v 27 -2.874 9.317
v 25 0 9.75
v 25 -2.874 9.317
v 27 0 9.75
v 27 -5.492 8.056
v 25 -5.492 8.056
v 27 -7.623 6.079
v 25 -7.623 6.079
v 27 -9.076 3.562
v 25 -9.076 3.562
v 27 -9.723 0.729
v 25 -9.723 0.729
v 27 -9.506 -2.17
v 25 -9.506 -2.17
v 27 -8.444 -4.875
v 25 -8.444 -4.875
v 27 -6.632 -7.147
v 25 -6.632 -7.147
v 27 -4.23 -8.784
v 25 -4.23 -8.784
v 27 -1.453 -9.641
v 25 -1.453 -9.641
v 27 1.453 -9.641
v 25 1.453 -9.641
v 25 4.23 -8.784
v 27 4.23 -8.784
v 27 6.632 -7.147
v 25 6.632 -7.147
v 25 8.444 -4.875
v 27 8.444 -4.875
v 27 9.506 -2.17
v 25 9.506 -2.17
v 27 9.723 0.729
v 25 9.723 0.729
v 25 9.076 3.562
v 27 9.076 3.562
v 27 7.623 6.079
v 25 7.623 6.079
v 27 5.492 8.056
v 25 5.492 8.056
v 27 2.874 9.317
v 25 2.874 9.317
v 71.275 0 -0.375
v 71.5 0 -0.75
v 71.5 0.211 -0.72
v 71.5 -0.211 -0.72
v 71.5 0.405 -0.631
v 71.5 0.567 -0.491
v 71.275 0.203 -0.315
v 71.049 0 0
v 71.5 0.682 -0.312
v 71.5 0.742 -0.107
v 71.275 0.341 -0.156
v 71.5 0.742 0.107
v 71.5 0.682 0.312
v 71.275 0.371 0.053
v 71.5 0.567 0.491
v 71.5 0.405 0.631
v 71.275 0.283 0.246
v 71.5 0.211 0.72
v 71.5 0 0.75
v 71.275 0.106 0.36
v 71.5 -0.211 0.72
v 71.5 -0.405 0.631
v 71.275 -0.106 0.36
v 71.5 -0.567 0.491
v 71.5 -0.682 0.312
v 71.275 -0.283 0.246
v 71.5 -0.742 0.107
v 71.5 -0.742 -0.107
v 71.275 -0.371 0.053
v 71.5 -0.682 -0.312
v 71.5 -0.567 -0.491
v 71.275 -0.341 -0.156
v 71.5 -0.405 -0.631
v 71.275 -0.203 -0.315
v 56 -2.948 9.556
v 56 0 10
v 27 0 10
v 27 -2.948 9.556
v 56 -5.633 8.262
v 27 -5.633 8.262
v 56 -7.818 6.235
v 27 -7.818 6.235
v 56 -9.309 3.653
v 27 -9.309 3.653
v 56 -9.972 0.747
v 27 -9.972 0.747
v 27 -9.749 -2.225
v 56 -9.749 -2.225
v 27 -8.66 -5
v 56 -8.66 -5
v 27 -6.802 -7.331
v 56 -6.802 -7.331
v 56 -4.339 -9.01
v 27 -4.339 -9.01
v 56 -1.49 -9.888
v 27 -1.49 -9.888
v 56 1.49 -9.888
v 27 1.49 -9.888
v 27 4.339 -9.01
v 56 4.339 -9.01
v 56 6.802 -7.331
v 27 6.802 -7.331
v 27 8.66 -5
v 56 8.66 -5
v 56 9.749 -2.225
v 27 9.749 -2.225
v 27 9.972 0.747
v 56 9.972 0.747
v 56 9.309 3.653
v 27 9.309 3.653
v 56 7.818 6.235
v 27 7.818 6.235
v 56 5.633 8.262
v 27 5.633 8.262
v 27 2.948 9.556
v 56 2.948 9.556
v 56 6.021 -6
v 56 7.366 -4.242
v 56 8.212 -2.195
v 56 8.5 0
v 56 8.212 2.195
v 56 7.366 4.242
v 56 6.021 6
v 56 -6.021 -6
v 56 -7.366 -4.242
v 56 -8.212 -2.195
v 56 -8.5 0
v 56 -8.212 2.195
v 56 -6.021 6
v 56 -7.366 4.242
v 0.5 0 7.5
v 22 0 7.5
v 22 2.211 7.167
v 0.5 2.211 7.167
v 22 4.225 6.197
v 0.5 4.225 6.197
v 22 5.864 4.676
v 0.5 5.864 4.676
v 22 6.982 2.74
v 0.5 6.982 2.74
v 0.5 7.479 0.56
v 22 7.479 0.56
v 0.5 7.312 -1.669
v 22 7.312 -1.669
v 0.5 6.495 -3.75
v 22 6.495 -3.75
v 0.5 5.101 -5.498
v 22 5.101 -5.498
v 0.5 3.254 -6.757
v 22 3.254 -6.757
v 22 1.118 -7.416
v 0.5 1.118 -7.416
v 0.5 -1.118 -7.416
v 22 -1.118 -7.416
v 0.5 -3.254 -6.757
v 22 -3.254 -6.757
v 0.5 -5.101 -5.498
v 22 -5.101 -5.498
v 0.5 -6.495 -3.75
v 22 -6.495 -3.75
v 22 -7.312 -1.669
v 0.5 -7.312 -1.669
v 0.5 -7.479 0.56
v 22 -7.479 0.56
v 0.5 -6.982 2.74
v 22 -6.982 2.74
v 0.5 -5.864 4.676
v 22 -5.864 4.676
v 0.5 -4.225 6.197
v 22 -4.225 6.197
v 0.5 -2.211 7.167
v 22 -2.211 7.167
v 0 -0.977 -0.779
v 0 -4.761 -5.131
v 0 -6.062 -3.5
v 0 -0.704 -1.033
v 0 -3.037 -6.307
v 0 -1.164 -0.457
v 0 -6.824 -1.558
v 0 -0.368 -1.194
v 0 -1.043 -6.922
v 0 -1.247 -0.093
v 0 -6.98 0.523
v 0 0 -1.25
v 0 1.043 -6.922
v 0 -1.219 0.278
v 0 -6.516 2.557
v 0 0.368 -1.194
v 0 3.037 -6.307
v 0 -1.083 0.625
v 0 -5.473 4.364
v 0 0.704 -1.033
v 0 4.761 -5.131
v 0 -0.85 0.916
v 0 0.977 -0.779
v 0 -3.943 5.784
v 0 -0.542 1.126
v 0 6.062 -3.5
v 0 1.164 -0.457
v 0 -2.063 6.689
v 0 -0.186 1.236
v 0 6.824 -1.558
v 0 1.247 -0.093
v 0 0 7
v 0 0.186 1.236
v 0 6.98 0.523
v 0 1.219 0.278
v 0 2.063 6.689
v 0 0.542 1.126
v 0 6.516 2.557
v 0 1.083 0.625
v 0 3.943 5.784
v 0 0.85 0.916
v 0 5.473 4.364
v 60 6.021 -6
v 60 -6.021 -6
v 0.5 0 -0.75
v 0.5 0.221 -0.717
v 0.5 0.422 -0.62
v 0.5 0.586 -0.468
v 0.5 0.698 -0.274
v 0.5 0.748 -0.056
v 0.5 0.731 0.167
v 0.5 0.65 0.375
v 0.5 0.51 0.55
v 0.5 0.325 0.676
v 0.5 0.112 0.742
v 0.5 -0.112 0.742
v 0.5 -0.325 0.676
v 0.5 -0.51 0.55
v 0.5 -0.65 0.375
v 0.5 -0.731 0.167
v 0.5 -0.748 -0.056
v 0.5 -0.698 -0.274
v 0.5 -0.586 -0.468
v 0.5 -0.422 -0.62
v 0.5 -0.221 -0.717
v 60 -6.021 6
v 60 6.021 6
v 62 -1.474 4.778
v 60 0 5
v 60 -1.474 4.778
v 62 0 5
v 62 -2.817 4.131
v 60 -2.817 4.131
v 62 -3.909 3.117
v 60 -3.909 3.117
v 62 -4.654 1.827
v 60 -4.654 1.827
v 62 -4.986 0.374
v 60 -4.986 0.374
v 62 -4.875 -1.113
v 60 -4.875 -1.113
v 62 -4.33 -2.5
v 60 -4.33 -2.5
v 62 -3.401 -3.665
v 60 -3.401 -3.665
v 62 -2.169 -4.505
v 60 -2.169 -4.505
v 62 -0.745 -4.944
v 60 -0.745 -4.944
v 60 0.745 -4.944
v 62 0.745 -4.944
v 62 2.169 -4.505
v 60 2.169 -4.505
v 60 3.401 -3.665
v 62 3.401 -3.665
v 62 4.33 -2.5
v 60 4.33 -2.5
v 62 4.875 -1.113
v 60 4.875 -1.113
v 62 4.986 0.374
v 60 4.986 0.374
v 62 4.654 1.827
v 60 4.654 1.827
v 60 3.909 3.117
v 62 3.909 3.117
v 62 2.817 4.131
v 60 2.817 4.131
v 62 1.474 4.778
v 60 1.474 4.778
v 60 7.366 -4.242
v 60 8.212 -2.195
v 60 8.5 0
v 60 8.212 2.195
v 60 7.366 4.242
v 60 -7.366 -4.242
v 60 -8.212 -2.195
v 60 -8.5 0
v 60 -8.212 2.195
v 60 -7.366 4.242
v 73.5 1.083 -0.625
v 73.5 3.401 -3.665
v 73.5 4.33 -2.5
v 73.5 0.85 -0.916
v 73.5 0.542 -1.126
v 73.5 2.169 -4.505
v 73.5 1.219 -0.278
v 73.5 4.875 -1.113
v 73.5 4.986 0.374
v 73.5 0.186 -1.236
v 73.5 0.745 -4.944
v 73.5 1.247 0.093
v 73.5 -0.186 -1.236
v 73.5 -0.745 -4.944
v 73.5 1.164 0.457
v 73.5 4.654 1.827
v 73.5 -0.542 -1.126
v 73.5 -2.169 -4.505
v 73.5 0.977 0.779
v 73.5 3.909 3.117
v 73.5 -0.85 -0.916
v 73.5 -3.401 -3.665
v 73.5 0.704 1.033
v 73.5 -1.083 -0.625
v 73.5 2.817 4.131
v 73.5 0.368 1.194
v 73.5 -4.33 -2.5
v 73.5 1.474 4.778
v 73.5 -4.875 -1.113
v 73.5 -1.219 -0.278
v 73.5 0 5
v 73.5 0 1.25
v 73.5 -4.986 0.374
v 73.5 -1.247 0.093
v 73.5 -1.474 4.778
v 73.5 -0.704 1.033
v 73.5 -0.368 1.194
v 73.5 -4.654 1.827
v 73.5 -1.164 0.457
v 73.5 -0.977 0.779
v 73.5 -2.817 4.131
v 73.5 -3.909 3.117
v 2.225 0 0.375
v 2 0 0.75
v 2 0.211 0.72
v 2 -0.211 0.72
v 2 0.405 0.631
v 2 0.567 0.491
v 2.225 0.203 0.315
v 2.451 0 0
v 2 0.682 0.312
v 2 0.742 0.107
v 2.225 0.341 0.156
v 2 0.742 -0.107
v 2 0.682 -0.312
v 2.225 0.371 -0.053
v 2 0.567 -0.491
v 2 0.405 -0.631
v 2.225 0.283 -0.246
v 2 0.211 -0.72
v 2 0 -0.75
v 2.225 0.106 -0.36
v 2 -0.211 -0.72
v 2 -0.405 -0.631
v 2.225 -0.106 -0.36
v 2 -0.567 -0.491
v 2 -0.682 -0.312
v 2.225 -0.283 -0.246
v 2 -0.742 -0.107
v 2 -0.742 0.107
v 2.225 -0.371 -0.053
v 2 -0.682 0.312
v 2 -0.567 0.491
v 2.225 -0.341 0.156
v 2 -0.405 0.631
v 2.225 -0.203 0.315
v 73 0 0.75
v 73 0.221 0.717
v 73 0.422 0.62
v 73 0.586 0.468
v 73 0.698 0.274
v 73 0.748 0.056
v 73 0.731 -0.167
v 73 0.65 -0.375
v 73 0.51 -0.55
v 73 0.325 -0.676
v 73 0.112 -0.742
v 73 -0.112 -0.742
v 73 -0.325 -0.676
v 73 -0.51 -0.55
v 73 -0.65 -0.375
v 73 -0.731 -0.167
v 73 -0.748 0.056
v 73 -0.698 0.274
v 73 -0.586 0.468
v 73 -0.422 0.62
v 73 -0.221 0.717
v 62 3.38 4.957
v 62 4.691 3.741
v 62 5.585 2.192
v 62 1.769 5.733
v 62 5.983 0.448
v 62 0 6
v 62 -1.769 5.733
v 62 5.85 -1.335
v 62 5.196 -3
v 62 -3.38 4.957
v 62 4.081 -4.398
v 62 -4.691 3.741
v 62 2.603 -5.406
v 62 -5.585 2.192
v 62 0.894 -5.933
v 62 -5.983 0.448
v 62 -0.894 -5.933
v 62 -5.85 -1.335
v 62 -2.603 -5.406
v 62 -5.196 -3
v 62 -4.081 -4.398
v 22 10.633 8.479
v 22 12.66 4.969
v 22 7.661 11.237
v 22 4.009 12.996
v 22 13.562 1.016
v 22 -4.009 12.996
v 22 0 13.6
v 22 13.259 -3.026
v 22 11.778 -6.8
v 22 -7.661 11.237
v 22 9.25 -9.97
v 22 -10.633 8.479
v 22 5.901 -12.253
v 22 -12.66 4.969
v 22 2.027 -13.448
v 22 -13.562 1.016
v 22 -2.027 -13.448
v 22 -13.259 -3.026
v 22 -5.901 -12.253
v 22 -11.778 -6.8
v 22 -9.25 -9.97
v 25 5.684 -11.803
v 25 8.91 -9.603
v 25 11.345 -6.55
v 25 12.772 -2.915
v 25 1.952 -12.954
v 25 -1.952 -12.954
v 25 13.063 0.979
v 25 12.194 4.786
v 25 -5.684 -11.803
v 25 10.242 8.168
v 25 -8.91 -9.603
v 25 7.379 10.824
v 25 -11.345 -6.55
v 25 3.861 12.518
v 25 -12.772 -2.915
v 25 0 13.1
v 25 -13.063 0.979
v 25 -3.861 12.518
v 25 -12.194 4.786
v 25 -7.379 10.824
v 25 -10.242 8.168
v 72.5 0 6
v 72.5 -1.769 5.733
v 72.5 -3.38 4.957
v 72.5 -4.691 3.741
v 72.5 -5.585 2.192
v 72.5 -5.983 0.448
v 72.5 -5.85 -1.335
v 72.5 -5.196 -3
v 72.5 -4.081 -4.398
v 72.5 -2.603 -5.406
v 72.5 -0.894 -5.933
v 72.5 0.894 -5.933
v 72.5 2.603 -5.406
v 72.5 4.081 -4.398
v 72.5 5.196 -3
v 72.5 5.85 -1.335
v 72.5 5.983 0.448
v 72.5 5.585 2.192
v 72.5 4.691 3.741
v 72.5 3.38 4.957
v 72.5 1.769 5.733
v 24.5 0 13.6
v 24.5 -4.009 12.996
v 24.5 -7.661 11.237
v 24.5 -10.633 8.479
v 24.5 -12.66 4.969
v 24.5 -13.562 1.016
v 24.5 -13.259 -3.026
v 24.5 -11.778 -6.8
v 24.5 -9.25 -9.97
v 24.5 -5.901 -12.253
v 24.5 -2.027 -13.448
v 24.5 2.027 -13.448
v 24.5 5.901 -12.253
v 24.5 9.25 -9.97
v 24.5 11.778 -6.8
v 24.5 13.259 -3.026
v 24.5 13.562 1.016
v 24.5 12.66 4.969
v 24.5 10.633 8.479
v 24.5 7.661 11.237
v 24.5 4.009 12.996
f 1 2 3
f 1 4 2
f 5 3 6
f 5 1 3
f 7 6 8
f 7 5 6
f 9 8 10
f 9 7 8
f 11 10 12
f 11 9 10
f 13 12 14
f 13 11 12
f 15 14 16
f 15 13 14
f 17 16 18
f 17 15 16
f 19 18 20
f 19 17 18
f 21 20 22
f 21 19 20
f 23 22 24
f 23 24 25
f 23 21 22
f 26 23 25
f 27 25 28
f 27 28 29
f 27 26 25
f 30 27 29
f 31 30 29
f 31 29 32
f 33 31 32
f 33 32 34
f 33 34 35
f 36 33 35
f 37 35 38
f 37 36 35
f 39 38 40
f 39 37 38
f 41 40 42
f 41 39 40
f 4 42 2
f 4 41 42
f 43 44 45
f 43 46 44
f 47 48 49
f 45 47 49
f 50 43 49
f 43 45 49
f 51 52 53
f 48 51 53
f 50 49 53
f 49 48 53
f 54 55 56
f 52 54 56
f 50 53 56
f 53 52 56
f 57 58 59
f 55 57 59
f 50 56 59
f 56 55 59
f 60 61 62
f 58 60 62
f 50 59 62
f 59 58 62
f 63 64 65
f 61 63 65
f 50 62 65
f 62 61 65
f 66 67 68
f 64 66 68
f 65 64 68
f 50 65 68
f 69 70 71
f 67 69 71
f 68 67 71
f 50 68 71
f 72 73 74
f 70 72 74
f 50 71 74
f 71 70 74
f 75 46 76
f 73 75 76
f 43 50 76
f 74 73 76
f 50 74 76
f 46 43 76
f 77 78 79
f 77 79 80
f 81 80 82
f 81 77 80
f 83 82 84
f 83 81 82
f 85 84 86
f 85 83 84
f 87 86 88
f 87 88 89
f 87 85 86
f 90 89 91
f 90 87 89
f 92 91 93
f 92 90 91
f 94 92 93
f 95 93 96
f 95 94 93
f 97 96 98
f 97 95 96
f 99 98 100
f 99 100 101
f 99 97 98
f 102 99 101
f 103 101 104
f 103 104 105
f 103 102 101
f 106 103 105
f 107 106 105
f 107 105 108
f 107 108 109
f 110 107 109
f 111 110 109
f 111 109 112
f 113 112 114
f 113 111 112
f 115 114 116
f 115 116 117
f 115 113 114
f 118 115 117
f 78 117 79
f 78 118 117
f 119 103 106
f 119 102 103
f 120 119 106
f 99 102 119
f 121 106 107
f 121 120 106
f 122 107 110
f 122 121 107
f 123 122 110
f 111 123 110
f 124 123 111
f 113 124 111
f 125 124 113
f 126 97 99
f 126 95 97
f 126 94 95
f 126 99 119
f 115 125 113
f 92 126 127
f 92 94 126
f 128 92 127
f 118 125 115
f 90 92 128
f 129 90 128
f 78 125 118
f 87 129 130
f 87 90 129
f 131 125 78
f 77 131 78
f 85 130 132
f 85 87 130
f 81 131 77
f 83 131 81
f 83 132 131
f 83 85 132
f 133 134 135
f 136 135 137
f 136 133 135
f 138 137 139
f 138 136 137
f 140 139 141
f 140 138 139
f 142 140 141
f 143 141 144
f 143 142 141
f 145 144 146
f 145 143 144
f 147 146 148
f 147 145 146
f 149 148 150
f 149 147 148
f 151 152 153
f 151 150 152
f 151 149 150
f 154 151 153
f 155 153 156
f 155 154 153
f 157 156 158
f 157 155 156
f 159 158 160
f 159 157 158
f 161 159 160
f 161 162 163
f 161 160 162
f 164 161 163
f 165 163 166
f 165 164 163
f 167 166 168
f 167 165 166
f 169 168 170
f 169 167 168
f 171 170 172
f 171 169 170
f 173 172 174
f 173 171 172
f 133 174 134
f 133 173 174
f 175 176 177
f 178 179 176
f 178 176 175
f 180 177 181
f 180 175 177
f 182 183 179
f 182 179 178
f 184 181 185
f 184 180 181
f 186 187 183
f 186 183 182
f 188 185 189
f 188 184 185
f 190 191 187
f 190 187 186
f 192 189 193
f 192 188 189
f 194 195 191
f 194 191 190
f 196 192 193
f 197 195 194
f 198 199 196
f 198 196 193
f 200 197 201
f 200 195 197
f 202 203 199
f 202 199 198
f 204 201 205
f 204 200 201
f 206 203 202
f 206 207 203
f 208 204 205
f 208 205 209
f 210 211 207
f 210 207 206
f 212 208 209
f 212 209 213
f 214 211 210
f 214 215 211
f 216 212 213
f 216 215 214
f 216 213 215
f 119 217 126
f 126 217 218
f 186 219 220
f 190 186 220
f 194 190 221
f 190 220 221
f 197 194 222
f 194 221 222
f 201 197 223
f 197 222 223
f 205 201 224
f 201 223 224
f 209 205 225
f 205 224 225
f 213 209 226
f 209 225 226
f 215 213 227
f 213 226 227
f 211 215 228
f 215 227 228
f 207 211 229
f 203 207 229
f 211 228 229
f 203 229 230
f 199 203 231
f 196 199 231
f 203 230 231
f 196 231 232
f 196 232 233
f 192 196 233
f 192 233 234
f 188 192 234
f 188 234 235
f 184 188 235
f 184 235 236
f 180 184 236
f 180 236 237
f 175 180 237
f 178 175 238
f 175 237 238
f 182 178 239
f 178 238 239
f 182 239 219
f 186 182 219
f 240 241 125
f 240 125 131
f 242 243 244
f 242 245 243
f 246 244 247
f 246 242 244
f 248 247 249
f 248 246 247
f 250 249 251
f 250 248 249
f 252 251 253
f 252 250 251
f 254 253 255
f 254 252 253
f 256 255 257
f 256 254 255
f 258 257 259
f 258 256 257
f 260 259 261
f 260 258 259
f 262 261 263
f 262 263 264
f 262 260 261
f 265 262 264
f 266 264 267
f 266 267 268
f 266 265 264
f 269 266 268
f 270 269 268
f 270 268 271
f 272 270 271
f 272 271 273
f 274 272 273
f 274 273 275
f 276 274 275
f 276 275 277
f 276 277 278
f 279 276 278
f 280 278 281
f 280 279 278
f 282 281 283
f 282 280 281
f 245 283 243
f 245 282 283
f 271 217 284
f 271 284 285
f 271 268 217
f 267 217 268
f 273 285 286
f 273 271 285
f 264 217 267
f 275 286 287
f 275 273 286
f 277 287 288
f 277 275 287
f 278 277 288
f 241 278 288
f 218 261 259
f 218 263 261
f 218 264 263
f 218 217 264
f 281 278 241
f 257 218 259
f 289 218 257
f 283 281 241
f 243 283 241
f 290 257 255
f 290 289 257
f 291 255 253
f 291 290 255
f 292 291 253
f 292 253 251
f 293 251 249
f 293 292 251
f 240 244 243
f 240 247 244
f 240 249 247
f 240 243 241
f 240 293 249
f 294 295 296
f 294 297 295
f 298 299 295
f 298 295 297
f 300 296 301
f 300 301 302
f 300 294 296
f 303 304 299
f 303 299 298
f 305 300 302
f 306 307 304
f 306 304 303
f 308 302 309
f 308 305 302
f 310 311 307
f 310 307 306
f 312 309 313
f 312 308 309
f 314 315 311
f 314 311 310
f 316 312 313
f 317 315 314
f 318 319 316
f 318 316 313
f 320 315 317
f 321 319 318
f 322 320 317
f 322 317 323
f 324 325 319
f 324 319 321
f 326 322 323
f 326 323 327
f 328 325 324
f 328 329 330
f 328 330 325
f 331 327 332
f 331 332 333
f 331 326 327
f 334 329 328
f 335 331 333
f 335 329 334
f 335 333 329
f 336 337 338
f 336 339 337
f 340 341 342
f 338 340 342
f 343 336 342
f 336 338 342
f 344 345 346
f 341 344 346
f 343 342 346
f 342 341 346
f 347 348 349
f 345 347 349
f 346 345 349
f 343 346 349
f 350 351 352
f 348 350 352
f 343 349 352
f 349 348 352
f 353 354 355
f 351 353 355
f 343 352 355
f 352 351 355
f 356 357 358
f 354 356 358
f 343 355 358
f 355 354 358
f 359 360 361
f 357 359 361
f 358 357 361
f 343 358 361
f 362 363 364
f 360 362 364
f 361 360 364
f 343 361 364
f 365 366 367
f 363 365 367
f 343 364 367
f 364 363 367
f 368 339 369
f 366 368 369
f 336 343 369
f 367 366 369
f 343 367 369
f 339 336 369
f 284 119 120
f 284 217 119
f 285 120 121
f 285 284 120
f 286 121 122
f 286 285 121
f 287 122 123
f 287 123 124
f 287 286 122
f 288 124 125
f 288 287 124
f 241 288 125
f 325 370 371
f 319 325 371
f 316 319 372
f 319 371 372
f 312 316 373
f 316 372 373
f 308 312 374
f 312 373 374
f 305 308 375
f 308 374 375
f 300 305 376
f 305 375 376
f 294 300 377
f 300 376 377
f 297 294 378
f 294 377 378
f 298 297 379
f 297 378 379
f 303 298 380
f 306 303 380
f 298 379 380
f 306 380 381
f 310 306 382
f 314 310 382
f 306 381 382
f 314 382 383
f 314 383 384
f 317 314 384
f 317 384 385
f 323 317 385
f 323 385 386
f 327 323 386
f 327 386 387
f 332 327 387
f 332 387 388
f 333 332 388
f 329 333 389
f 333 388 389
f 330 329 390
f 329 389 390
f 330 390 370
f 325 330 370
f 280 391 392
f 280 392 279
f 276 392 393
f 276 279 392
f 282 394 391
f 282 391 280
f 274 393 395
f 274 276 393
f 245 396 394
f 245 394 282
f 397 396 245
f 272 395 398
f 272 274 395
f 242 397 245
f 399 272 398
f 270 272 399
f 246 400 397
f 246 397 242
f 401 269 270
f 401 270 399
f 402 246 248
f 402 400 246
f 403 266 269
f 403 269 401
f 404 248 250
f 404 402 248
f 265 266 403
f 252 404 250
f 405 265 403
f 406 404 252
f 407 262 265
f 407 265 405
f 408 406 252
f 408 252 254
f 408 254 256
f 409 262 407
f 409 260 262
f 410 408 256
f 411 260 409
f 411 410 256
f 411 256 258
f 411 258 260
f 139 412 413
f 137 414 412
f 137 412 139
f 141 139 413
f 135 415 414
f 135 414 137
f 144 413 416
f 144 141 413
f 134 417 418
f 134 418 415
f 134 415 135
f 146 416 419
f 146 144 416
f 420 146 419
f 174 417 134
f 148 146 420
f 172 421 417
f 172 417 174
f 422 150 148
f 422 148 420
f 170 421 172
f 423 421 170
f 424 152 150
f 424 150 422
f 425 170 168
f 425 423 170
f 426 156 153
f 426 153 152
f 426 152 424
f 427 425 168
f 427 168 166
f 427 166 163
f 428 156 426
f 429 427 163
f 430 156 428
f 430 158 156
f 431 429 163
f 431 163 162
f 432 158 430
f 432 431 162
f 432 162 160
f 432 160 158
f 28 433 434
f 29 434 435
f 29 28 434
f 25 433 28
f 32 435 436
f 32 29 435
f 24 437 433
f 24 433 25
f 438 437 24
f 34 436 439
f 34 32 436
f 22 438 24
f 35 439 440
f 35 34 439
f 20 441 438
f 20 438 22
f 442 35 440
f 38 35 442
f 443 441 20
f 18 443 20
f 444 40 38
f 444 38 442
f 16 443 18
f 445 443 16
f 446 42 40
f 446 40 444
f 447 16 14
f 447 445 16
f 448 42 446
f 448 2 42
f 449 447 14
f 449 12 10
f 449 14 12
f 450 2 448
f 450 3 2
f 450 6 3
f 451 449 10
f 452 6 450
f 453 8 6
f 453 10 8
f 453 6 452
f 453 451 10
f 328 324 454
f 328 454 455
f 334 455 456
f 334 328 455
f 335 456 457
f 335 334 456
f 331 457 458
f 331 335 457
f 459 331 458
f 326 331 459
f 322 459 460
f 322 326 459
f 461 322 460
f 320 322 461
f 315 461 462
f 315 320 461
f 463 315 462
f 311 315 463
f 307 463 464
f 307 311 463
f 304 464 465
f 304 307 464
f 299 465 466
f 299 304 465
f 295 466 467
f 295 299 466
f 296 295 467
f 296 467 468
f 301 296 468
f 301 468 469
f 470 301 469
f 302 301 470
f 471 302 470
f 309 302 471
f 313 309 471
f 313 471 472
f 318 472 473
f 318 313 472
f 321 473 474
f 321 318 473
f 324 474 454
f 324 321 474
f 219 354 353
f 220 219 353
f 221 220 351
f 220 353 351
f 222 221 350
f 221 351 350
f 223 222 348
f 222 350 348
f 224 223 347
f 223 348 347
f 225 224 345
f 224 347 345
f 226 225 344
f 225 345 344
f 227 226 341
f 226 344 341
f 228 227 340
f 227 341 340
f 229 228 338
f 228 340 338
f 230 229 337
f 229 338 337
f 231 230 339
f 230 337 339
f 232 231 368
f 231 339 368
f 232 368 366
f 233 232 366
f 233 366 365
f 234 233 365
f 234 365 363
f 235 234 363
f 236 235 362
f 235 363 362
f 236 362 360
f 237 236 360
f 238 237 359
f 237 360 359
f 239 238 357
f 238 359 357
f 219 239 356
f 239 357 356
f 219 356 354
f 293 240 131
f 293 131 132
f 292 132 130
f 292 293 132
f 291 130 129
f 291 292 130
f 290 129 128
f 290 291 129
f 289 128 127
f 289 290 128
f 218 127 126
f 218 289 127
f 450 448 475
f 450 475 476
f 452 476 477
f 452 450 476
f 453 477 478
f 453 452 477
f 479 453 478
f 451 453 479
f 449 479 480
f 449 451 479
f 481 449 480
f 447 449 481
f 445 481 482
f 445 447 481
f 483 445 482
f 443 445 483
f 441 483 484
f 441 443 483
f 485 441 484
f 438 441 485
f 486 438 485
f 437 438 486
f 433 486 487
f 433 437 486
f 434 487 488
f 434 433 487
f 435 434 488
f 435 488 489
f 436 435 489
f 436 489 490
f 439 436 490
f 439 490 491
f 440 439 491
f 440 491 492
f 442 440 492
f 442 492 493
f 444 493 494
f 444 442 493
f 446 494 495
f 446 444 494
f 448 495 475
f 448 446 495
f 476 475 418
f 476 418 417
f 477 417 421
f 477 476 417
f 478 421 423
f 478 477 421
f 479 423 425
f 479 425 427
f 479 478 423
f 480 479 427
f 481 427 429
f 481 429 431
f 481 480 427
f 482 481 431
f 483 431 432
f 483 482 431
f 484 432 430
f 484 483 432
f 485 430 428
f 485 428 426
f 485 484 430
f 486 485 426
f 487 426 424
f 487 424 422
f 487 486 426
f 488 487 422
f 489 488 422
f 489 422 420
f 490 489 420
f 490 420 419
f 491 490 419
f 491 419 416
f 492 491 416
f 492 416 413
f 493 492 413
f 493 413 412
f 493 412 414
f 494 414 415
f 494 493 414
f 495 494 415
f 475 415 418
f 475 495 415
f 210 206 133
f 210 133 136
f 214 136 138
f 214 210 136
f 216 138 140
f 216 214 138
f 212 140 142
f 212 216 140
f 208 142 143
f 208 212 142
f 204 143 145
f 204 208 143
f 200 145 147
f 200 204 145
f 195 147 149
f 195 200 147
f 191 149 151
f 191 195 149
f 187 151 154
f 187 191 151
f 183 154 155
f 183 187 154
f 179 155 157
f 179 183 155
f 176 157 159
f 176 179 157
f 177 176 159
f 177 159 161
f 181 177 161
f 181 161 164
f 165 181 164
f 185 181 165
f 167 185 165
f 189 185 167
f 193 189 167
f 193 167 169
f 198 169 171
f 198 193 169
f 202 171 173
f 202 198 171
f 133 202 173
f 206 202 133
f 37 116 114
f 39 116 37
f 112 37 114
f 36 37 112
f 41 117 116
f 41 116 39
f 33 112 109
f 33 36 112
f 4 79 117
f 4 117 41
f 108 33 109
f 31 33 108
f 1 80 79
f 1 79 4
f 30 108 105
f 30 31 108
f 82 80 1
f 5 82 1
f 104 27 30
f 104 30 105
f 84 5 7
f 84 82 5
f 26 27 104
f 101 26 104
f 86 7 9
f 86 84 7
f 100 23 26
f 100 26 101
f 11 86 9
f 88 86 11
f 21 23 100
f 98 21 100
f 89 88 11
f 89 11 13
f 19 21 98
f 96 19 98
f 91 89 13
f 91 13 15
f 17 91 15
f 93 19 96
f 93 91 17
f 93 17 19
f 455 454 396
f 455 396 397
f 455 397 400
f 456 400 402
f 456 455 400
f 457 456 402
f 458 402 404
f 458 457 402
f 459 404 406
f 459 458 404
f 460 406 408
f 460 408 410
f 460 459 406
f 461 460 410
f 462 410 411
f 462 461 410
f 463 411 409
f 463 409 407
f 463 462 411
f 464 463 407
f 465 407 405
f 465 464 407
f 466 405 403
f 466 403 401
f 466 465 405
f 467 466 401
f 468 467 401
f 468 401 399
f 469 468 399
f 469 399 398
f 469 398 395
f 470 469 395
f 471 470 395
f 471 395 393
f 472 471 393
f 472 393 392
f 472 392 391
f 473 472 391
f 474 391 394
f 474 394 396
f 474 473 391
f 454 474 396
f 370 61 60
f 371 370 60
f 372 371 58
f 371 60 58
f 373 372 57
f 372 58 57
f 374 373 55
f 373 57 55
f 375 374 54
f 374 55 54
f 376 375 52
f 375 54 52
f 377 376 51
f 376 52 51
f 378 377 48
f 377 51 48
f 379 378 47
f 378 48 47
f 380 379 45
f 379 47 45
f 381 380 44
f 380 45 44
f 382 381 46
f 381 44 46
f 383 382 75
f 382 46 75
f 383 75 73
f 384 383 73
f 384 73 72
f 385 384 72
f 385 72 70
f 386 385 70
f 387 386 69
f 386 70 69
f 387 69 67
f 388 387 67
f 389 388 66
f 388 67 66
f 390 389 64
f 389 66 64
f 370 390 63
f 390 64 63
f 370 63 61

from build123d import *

# Parameters (mm, degrees)
CHANFREIN1_SIZE                     = 0.5
ENL_V_MAT_EXTRU_1_DEPTH             = 4
CHANFREIN2_SIZE                     = 1
DIAM_TRE_DU_PER_AGE_1_5_1_5_1_D     = 1.5
DIAM_TRE_DU_PER_AGE_1_5_1_5_1_DEPTH = 2
DIAM_TRE_DU_PER_AGE_1_5_1_5_1_TIP   = 0.450645464
CHANFREIN3_SIZE                     = 0.5
DIAM_TRE_DU_PER_AGE_1_5_1_5_2_D     = 1.5
DIAM_TRE_DU_PER_AGE_1_5_1_5_2_DEPTH = 2
DIAM_TRE_DU_PER_AGE_1_5_1_5_2_TIP   = 0.450645464
CHANFREIN4_SIZE                     = 0.5
BOSS_EXTRU_1_REACH                  = 77.975
ESQUISSE9_R                         = 7.5
ESQUISSE9_R_2                       = 4.5
CHANFREIN5_SIZE                     = 0.5


with BuildPart() as part:
    # Esquisse1 → Révolution1 (revolve)
    with BuildSketch(Plane.XY, mode=Mode.PRIVATE) as r_volution1_sk:
        Polygon((0, 0), (0, 5), (6, 5), (6, 4.75), (8, 4.75), (8, 7.5), (22, 7.5), (22, 13.6), (25, 13.6), (25, 9.75), (27, 9.75), (27, 10), (56, 10), (56, 8.5), (60, 8.5), (60, 5), (62, 5), (62, 6), (73.5, 6), (73.5, 0), align=None)
    revolve(r_volution1_sk.sketch.rotate(Axis((0, 0, 0), (1, 0, 0)), 90), axis=Axis((0, 0, 0), (1, 0, 0)))

    # Chanfrein1
    chanfrein1_edges = [part.edges().sort_by_distance(p)[0] for p in [
        (0, 0, -5),
        (8, 0, -4.75),
        (8, 0, -7.5),
        (25, 0, -13.6),
    ]]
    chamfer(chanfrein1_edges, length=CHANFREIN1_SIZE)

    # Esquisse2 → Enlèv. mat.-Extru.1 (cut)
    with BuildSketch(Plane(origin=(60, 0, 0), x_dir=(0, 0, -1), z_dir=(1, 0, 0))):
        with BuildLine():
            Line((-6, 12.573525265), (-6, -12.573525265))
            ThreePointArc((-6, -12.573525265), (-13.931745676, 0), (-6, 12.573525265))
        make_face()
        with BuildLine():
            Line((6, 12.573525265), (6, -12.573525265))
            ThreePointArc((6, -12.573525265), (13.931745676, 0), (6, 12.573525265))
        make_face()
    extrude(amount=-ENL_V_MAT_EXTRU_1_DEPTH, mode=Mode.SUBTRACT)

    # Chanfrein2
    chanfrein2_edges = [part.edges().sort_by_distance(p)[0] for p in [
        (73.5, 0, -6),
    ]]
    chamfer(chanfrein2_edges, length=CHANFREIN2_SIZE)

    # Diamètre du perçage Ø1.5 (1.5)1
    with Locations(Plane(origin=(73.5, 0, 0), x_dir=(0, 0, -1), z_dir=(1, 0, 0))):
        with Locations((0, 0)):
            Hole(DIAM_TRE_DU_PER_AGE_1_5_1_5_1_D / 2, depth=DIAM_TRE_DU_PER_AGE_1_5_1_5_1_DEPTH)
            with Locations((0, 0, -(DIAM_TRE_DU_PER_AGE_1_5_1_5_1_DEPTH + DIAM_TRE_DU_PER_AGE_1_5_1_5_1_TIP / 2))):  # 118° drill point
                Cone(0, DIAM_TRE_DU_PER_AGE_1_5_1_5_1_D / 2, DIAM_TRE_DU_PER_AGE_1_5_1_5_1_TIP, mode=Mode.SUBTRACT)

    # Chanfrein3
    chanfrein3_edges = [part.edges().sort_by_distance(p)[0] for p in [
        (73.5, 0, -0.75),
    ]]
    chamfer(chanfrein3_edges, length=CHANFREIN3_SIZE)

    # Diamètre du perçage Ø1.5 (1.5)2
    with Locations(Plane.ZY):
        with Locations((0, 0)):
            Hole(DIAM_TRE_DU_PER_AGE_1_5_1_5_2_D / 2, depth=DIAM_TRE_DU_PER_AGE_1_5_1_5_2_DEPTH)
            with Locations((0, 0, -(DIAM_TRE_DU_PER_AGE_1_5_1_5_2_DEPTH + DIAM_TRE_DU_PER_AGE_1_5_1_5_2_TIP / 2))):  # 118° drill point
                Cone(0, DIAM_TRE_DU_PER_AGE_1_5_1_5_2_D / 2, DIAM_TRE_DU_PER_AGE_1_5_1_5_2_TIP, mode=Mode.SUBTRACT)

    # Chanfrein4
    chanfrein4_edges = [part.edges().sort_by_distance(p)[0] for p in [
        (0, 0, 0.75),
    ]]
    chamfer(chanfrein4_edges, length=CHANFREIN4_SIZE)

    # Esquisse9 → Boss.-Extru.1 (add, up to next)
    with BuildSketch(Plane.ZY, mode=Mode.PRIVATE) as boss_extru_1_sk1:
        Circle(ESQUISSE9_R)
        Circle(ESQUISSE9_R_2, mode=Mode.SUBTRACT)
    boss_extru_1_tool1 = extrude(boss_extru_1_sk1.sketch, amount=-BOSS_EXTRU_1_REACH, mode=Mode.PRIVATE) - part.part
    add(boss_extru_1_tool1.solids().sort_by_distance((0, 0, -7.287868))[0])

    # Chanfrein5
    chanfrein5_edges = [part.edges().sort_by_distance(p)[0] for p in [
        (0, 0, -7.5),
    ]]
    chamfer(chanfrein5_edges, length=CHANFREIN5_SIZE)


solid = part.part
